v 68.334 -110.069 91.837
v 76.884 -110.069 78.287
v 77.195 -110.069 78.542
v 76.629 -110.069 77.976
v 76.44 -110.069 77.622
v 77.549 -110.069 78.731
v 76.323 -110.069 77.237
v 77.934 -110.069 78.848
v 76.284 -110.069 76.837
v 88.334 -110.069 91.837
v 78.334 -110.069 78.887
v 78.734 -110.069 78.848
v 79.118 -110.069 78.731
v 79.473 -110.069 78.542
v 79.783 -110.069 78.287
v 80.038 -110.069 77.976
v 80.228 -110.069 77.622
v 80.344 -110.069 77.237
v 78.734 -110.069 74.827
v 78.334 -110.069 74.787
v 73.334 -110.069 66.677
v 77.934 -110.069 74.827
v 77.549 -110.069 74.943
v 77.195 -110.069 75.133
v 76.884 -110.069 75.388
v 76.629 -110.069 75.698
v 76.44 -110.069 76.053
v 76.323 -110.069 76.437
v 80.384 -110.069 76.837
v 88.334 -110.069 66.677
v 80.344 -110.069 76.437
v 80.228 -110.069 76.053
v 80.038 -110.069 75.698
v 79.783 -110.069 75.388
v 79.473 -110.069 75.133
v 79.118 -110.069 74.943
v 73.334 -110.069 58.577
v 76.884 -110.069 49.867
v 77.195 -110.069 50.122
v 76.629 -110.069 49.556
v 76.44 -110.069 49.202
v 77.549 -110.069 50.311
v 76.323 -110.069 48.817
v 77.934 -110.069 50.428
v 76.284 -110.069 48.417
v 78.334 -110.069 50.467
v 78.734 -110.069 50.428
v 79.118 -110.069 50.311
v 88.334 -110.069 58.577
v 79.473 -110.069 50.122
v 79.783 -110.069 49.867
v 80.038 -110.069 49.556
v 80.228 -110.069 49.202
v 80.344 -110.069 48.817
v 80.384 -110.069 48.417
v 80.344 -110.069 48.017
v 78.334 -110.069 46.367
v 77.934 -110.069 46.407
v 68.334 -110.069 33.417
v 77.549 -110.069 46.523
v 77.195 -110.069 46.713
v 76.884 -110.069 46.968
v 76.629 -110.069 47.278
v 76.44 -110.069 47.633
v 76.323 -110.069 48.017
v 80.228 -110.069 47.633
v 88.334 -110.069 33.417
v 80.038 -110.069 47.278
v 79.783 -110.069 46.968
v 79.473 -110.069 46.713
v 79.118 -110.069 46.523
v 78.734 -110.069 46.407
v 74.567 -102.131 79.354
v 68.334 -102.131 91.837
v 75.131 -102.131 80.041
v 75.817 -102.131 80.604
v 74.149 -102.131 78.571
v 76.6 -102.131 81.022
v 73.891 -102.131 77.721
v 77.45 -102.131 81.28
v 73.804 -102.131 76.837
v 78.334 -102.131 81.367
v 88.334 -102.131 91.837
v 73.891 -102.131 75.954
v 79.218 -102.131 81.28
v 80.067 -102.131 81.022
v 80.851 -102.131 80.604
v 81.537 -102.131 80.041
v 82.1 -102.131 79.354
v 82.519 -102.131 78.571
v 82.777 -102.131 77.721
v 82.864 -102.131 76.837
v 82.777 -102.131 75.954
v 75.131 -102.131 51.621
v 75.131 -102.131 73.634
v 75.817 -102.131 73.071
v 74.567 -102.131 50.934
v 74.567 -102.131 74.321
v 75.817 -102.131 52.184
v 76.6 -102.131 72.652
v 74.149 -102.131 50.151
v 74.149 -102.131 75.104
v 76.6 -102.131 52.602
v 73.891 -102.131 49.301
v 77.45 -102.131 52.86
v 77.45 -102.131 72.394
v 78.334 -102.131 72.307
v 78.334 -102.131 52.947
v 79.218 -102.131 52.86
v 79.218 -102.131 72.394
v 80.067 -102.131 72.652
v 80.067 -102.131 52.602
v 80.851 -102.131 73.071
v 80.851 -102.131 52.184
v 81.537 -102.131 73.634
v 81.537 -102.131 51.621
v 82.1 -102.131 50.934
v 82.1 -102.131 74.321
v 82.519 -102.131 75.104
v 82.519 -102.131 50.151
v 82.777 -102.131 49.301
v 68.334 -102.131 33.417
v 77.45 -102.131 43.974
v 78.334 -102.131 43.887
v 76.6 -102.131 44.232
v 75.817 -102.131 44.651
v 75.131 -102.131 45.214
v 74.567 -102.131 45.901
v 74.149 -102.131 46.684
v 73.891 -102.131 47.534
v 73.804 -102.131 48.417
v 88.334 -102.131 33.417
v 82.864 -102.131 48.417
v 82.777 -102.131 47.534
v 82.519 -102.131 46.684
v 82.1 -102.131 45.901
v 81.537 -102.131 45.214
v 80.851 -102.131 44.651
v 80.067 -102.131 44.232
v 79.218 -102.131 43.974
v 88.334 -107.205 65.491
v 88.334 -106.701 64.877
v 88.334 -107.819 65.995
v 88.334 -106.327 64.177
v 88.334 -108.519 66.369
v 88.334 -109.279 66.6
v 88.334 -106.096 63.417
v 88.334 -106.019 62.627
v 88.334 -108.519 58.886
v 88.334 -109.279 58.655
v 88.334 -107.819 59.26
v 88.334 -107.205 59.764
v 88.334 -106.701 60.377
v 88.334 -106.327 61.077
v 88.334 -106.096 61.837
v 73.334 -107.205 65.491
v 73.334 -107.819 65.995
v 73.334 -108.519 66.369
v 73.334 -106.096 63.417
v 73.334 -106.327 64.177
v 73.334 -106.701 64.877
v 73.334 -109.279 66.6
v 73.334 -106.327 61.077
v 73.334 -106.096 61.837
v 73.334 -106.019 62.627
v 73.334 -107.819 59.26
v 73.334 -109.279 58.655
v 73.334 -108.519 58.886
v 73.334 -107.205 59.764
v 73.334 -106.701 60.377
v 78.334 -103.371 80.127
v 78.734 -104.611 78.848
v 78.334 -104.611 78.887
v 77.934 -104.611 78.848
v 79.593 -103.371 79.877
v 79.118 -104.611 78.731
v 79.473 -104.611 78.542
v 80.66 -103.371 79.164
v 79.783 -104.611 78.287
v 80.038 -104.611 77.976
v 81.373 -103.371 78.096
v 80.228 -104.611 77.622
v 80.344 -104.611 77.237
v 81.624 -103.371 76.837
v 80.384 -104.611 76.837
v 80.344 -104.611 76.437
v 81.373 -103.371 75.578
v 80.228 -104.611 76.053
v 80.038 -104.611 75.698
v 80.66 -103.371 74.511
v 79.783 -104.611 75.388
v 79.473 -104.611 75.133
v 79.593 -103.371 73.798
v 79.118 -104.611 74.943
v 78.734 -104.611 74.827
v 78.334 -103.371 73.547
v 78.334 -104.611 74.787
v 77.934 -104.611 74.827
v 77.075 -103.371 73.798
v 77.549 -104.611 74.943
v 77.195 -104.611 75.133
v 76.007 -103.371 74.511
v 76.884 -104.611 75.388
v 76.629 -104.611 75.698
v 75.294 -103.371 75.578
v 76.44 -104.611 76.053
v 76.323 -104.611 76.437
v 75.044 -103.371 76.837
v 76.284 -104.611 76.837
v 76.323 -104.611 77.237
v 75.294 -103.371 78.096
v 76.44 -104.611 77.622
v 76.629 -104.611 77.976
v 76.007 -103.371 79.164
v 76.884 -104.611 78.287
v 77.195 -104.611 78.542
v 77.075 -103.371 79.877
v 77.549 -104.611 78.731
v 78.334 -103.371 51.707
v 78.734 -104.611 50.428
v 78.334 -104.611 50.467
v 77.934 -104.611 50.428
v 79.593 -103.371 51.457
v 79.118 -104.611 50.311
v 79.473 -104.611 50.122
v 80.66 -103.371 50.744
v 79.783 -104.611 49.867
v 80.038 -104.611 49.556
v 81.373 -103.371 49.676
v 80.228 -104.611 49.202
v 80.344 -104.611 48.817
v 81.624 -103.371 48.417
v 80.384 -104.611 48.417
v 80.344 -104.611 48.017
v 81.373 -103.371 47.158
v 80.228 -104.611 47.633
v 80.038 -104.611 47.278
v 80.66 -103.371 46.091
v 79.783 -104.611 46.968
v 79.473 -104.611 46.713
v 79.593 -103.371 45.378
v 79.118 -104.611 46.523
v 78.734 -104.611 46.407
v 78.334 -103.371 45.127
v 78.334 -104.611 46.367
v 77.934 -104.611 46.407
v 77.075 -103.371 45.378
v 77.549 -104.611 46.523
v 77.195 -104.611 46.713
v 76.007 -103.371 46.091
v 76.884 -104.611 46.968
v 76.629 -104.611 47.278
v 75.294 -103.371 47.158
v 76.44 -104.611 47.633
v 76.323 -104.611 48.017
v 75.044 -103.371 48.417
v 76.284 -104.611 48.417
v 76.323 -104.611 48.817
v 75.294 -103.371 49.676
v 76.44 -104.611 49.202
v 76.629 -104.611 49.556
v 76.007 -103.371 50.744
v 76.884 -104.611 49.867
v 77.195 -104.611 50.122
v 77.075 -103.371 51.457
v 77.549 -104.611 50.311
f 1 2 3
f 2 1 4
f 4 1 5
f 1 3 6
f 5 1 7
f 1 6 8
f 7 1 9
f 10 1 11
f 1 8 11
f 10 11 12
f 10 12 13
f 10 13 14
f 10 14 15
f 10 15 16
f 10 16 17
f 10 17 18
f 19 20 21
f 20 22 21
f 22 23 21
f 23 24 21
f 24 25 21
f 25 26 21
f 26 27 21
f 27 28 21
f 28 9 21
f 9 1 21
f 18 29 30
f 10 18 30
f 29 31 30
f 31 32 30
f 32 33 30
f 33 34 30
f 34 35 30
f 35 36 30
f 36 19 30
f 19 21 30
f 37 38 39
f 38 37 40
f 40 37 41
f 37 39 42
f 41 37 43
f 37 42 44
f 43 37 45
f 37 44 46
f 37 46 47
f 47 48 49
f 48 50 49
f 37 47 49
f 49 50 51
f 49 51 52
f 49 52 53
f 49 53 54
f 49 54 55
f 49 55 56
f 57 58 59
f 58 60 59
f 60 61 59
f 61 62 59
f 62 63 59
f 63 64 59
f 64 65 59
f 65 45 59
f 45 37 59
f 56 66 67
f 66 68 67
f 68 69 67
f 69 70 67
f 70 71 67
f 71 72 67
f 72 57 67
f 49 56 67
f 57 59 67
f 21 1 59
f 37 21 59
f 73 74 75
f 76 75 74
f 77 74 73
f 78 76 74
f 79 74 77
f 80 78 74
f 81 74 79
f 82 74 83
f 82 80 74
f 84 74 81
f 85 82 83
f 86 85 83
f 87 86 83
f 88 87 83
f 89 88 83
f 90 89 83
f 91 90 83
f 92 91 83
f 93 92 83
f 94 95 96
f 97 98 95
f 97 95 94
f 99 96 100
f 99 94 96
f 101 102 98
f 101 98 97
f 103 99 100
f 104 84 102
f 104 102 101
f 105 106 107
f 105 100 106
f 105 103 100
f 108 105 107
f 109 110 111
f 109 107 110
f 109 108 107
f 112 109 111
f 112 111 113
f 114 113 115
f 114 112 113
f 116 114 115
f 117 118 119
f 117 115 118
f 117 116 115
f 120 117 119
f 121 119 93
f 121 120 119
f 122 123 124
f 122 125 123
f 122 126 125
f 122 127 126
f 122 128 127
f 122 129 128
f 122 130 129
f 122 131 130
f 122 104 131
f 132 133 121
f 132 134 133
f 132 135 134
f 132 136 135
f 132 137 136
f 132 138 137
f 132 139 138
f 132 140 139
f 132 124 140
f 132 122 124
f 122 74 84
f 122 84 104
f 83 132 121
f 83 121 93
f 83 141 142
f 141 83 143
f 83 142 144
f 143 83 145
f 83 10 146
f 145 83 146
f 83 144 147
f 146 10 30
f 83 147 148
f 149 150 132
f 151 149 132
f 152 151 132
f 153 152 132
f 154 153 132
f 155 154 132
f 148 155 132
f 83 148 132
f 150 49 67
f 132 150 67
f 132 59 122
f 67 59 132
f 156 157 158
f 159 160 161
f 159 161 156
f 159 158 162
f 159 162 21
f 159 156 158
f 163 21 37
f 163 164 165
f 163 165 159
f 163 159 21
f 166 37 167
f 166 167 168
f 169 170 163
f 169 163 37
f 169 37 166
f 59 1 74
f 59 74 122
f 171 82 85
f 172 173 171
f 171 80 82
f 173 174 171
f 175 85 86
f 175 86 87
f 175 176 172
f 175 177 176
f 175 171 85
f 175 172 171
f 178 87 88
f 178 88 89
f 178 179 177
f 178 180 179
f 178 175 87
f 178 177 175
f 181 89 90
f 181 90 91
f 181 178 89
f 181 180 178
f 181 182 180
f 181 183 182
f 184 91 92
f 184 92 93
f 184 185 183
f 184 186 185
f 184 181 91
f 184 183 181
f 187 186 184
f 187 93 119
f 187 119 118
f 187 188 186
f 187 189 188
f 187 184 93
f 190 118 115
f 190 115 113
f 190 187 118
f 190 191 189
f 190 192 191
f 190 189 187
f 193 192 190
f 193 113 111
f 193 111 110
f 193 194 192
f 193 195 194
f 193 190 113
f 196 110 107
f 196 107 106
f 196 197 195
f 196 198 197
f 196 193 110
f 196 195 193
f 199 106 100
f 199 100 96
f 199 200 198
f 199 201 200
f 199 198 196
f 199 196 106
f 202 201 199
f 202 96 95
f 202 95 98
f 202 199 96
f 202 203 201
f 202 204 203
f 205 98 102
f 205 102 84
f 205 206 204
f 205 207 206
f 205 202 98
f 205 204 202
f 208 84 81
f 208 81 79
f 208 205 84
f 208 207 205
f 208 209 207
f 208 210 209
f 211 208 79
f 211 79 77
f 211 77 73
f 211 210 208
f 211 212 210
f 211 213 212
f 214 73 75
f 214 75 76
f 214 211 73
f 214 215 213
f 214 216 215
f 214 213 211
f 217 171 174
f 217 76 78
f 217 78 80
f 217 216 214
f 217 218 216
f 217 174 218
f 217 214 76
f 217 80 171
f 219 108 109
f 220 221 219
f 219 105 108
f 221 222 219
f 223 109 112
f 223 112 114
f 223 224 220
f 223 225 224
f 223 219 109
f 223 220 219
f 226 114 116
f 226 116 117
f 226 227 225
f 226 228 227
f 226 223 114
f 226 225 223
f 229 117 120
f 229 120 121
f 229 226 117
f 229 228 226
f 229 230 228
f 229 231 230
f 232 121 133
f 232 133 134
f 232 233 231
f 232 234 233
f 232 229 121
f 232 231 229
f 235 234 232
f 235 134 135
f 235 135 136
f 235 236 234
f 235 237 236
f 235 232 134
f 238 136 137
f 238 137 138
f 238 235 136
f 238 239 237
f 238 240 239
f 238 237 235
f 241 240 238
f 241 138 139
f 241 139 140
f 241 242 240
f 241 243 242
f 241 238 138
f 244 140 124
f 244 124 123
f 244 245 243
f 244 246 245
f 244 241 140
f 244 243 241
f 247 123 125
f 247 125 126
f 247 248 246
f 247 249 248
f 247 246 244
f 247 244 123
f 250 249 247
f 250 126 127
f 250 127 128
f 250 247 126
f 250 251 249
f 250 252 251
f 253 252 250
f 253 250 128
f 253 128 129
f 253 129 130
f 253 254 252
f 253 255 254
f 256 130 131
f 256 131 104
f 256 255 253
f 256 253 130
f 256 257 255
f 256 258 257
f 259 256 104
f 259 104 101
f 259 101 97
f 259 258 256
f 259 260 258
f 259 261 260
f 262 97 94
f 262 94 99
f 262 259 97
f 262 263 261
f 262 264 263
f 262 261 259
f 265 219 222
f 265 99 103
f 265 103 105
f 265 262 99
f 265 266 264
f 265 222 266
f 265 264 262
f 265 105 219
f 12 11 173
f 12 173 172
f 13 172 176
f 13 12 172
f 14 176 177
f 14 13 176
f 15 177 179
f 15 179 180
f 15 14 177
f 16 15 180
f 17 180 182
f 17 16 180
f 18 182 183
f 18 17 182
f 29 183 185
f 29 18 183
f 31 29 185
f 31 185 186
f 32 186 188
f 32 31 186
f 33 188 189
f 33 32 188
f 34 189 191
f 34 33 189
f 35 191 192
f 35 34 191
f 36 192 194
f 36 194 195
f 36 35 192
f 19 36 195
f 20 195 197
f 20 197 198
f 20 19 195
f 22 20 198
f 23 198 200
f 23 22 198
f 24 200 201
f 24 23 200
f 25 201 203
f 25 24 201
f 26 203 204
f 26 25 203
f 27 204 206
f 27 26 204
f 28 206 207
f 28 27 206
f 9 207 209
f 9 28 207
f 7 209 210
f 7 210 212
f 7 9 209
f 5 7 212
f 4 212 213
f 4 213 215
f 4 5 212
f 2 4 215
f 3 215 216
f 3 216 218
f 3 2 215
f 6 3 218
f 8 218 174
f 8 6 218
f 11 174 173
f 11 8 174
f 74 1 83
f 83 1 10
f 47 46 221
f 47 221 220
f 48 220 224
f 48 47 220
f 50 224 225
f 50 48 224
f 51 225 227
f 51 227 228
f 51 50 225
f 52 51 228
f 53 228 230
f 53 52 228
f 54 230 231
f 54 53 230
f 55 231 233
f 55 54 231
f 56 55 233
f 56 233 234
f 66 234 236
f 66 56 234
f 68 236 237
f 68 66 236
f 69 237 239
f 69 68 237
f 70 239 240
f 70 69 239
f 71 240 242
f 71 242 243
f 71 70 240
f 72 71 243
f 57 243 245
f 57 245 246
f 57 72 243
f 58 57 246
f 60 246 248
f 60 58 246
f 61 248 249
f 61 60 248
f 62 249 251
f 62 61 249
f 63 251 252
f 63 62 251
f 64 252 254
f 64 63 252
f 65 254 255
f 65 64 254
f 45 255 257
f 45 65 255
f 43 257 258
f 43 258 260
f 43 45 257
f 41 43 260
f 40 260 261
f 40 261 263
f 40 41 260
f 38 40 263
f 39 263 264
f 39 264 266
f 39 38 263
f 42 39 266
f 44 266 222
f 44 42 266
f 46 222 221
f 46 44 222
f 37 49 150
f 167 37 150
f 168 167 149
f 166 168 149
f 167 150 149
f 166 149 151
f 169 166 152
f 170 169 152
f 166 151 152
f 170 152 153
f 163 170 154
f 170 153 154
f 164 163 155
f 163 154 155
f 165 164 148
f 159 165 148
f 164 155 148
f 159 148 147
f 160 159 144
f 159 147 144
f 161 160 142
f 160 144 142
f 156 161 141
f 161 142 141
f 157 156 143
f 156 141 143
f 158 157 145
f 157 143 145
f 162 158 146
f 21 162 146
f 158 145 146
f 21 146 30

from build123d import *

# Parameters (mm, degrees)
SKETCH1_W           = 20
SKETCH1_H           = 58.42
SKETCH1_R           = 2.05
BOSS_EXTRUDE1_DEPTH = 7.9375
SKETCH2_R           = 4.05
CUT_EXTRUDE1_DEPTH  = 15
CHAMFER1_SIZE       = 2.48


with BuildPart() as part:
    # Sketch1 → Boss-Extrude1 (new body)
    with BuildSketch(Plane(origin=(0, -110.068674648, 0), x_dir=(1, 0, 0), z_dir=(0, 1, 0))):
        with Locations((78.333864278, -62.627324848)):
            Rectangle(SKETCH1_W, SKETCH1_H)
        with Locations(Location((78.333864278, -76.837324848, 0), (0, 0, 270))):
            Circle(SKETCH1_R, mode=Mode.SUBTRACT)
        with Locations(Location((78.333864278, -48.417324848, 0), (0, 0, 270))):
            Circle(SKETCH1_R, mode=Mode.SUBTRACT)
    extrude(amount=BOSS_EXTRUDE1_DEPTH)

    # Sketch2 → Cut-Extrude1 (cut)
    with BuildSketch(Plane(origin=(88.333864278, -1.5875, 4.936331956), x_dir=(0, 0, -1), z_dir=(1, 0, 0))):
        with Locations((-57.690992892, -108.481174648)):
            Circle(SKETCH2_R)
    extrude(amount=-CUT_EXTRUDE1_DEPTH, mode=Mode.SUBTRACT)

    # Chamfer1
    chamfer1_edges = [part.edges().sort_by_distance(p)[0] for p in [
        (78.333864278, -102.131174648, 74.787324848),
        (78.333864278, -102.131174648, 46.367324848),
    ]]
    chamfer(chamfer1_edges, length=CHAMFER1_SIZE)


solid = part.part
